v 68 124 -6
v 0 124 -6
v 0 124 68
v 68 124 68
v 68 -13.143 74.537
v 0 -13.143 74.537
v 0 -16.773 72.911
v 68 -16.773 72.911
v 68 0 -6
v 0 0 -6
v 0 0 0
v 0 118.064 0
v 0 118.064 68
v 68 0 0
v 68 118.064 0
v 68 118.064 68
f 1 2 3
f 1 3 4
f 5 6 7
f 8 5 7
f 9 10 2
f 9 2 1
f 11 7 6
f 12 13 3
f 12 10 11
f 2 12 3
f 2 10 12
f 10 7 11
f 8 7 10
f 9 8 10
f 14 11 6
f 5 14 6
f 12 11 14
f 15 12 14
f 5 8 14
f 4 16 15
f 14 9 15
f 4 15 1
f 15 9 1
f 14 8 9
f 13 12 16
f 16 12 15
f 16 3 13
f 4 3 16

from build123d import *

# Parameters (mm, degrees)
SKETCH1_W           = 68
SKETCH1_H           = 6
BOSS_EXTRUDE1_DEPTH = 124
BOSS_EXTRUDE2_DEPTH = 68
SKETCH4_W           = 68
SKETCH4_H           = 5.93639456
BOSS_EXTRUDE3_DEPTH = 68


with BuildPart() as part:
    # Sketch1 → Boss-Extrude1 (new body)
    with BuildSketch(Plane(origin=(0, 0, 0), x_dir=(1, 0, 0), z_dir=(0, 1, 0))):
        with Locations((34, 3)):
            Rectangle(SKETCH1_W, SKETCH1_H)
    extrude(amount=BOSS_EXTRUDE1_DEPTH)

    # Sketch3 → Boss-Extrude2 (add)
    with BuildSketch(Plane(origin=(0, 0, 0), x_dir=(0, 0, -1), z_dir=(1, 0, 0))):
        Polygon((0, 0), (-74.536565036, -13.142807465), (-72.911197136, -16.77309274), (6, 0), align=None)
    extrude(amount=BOSS_EXTRUDE2_DEPTH)

    # Sketch4 → Boss-Extrude3 (add)
    with BuildSketch(Plane.XY):
        with Locations((34, 121.03180272)):
            Rectangle(SKETCH4_W, SKETCH4_H)
    extrude(amount=BOSS_EXTRUDE3_DEPTH)


solid = part.part
